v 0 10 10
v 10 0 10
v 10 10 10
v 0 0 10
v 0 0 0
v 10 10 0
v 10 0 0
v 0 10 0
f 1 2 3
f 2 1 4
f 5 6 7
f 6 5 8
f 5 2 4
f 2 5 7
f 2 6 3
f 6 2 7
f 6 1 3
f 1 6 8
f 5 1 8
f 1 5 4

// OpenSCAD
// `!` is the root modifier: only that subtree renders. OpenSCAD resolves it
// before the CSG is written, so its `.csg` holds the cube and nothing else.
//
// 🔴 THIS HEADER SAID `scad.ts` "refuses it by name and drops the subtree" UNTIL
// 2026-08-11, AND THAT STOPPED BEING TRUE AT `fbfe2738f1`. `!` is implemented:
// the marked subtree becomes the whole model, stripped of its ancestors, and the
// sphere below is dropped exactly as OpenSCAD drops it. The sentence was copied
// out of the harness README's dated results table, where it was true when
// written — ⚠ *a dated measurement quoted without its date becomes a claim about
// the present*, and this one described the product to anyone who read the case
// before reading the code.
//
// ⚠ WHAT THIS CASE COVERS IS ONE MODIFIER ON ONE STATEMENT, AND THAT WAS NOT
// ENOUGH. It scored `SAME` before AND after all four interaction defects fixed
// in `d749b176c2`. The combinations are `edge_modifier_root_{on_disabled,nested,
// in_background,on_background}`; read the set, not this file alone.
!cube([10, 10, 10]);
sphere(r = 20, $fn = 16);
